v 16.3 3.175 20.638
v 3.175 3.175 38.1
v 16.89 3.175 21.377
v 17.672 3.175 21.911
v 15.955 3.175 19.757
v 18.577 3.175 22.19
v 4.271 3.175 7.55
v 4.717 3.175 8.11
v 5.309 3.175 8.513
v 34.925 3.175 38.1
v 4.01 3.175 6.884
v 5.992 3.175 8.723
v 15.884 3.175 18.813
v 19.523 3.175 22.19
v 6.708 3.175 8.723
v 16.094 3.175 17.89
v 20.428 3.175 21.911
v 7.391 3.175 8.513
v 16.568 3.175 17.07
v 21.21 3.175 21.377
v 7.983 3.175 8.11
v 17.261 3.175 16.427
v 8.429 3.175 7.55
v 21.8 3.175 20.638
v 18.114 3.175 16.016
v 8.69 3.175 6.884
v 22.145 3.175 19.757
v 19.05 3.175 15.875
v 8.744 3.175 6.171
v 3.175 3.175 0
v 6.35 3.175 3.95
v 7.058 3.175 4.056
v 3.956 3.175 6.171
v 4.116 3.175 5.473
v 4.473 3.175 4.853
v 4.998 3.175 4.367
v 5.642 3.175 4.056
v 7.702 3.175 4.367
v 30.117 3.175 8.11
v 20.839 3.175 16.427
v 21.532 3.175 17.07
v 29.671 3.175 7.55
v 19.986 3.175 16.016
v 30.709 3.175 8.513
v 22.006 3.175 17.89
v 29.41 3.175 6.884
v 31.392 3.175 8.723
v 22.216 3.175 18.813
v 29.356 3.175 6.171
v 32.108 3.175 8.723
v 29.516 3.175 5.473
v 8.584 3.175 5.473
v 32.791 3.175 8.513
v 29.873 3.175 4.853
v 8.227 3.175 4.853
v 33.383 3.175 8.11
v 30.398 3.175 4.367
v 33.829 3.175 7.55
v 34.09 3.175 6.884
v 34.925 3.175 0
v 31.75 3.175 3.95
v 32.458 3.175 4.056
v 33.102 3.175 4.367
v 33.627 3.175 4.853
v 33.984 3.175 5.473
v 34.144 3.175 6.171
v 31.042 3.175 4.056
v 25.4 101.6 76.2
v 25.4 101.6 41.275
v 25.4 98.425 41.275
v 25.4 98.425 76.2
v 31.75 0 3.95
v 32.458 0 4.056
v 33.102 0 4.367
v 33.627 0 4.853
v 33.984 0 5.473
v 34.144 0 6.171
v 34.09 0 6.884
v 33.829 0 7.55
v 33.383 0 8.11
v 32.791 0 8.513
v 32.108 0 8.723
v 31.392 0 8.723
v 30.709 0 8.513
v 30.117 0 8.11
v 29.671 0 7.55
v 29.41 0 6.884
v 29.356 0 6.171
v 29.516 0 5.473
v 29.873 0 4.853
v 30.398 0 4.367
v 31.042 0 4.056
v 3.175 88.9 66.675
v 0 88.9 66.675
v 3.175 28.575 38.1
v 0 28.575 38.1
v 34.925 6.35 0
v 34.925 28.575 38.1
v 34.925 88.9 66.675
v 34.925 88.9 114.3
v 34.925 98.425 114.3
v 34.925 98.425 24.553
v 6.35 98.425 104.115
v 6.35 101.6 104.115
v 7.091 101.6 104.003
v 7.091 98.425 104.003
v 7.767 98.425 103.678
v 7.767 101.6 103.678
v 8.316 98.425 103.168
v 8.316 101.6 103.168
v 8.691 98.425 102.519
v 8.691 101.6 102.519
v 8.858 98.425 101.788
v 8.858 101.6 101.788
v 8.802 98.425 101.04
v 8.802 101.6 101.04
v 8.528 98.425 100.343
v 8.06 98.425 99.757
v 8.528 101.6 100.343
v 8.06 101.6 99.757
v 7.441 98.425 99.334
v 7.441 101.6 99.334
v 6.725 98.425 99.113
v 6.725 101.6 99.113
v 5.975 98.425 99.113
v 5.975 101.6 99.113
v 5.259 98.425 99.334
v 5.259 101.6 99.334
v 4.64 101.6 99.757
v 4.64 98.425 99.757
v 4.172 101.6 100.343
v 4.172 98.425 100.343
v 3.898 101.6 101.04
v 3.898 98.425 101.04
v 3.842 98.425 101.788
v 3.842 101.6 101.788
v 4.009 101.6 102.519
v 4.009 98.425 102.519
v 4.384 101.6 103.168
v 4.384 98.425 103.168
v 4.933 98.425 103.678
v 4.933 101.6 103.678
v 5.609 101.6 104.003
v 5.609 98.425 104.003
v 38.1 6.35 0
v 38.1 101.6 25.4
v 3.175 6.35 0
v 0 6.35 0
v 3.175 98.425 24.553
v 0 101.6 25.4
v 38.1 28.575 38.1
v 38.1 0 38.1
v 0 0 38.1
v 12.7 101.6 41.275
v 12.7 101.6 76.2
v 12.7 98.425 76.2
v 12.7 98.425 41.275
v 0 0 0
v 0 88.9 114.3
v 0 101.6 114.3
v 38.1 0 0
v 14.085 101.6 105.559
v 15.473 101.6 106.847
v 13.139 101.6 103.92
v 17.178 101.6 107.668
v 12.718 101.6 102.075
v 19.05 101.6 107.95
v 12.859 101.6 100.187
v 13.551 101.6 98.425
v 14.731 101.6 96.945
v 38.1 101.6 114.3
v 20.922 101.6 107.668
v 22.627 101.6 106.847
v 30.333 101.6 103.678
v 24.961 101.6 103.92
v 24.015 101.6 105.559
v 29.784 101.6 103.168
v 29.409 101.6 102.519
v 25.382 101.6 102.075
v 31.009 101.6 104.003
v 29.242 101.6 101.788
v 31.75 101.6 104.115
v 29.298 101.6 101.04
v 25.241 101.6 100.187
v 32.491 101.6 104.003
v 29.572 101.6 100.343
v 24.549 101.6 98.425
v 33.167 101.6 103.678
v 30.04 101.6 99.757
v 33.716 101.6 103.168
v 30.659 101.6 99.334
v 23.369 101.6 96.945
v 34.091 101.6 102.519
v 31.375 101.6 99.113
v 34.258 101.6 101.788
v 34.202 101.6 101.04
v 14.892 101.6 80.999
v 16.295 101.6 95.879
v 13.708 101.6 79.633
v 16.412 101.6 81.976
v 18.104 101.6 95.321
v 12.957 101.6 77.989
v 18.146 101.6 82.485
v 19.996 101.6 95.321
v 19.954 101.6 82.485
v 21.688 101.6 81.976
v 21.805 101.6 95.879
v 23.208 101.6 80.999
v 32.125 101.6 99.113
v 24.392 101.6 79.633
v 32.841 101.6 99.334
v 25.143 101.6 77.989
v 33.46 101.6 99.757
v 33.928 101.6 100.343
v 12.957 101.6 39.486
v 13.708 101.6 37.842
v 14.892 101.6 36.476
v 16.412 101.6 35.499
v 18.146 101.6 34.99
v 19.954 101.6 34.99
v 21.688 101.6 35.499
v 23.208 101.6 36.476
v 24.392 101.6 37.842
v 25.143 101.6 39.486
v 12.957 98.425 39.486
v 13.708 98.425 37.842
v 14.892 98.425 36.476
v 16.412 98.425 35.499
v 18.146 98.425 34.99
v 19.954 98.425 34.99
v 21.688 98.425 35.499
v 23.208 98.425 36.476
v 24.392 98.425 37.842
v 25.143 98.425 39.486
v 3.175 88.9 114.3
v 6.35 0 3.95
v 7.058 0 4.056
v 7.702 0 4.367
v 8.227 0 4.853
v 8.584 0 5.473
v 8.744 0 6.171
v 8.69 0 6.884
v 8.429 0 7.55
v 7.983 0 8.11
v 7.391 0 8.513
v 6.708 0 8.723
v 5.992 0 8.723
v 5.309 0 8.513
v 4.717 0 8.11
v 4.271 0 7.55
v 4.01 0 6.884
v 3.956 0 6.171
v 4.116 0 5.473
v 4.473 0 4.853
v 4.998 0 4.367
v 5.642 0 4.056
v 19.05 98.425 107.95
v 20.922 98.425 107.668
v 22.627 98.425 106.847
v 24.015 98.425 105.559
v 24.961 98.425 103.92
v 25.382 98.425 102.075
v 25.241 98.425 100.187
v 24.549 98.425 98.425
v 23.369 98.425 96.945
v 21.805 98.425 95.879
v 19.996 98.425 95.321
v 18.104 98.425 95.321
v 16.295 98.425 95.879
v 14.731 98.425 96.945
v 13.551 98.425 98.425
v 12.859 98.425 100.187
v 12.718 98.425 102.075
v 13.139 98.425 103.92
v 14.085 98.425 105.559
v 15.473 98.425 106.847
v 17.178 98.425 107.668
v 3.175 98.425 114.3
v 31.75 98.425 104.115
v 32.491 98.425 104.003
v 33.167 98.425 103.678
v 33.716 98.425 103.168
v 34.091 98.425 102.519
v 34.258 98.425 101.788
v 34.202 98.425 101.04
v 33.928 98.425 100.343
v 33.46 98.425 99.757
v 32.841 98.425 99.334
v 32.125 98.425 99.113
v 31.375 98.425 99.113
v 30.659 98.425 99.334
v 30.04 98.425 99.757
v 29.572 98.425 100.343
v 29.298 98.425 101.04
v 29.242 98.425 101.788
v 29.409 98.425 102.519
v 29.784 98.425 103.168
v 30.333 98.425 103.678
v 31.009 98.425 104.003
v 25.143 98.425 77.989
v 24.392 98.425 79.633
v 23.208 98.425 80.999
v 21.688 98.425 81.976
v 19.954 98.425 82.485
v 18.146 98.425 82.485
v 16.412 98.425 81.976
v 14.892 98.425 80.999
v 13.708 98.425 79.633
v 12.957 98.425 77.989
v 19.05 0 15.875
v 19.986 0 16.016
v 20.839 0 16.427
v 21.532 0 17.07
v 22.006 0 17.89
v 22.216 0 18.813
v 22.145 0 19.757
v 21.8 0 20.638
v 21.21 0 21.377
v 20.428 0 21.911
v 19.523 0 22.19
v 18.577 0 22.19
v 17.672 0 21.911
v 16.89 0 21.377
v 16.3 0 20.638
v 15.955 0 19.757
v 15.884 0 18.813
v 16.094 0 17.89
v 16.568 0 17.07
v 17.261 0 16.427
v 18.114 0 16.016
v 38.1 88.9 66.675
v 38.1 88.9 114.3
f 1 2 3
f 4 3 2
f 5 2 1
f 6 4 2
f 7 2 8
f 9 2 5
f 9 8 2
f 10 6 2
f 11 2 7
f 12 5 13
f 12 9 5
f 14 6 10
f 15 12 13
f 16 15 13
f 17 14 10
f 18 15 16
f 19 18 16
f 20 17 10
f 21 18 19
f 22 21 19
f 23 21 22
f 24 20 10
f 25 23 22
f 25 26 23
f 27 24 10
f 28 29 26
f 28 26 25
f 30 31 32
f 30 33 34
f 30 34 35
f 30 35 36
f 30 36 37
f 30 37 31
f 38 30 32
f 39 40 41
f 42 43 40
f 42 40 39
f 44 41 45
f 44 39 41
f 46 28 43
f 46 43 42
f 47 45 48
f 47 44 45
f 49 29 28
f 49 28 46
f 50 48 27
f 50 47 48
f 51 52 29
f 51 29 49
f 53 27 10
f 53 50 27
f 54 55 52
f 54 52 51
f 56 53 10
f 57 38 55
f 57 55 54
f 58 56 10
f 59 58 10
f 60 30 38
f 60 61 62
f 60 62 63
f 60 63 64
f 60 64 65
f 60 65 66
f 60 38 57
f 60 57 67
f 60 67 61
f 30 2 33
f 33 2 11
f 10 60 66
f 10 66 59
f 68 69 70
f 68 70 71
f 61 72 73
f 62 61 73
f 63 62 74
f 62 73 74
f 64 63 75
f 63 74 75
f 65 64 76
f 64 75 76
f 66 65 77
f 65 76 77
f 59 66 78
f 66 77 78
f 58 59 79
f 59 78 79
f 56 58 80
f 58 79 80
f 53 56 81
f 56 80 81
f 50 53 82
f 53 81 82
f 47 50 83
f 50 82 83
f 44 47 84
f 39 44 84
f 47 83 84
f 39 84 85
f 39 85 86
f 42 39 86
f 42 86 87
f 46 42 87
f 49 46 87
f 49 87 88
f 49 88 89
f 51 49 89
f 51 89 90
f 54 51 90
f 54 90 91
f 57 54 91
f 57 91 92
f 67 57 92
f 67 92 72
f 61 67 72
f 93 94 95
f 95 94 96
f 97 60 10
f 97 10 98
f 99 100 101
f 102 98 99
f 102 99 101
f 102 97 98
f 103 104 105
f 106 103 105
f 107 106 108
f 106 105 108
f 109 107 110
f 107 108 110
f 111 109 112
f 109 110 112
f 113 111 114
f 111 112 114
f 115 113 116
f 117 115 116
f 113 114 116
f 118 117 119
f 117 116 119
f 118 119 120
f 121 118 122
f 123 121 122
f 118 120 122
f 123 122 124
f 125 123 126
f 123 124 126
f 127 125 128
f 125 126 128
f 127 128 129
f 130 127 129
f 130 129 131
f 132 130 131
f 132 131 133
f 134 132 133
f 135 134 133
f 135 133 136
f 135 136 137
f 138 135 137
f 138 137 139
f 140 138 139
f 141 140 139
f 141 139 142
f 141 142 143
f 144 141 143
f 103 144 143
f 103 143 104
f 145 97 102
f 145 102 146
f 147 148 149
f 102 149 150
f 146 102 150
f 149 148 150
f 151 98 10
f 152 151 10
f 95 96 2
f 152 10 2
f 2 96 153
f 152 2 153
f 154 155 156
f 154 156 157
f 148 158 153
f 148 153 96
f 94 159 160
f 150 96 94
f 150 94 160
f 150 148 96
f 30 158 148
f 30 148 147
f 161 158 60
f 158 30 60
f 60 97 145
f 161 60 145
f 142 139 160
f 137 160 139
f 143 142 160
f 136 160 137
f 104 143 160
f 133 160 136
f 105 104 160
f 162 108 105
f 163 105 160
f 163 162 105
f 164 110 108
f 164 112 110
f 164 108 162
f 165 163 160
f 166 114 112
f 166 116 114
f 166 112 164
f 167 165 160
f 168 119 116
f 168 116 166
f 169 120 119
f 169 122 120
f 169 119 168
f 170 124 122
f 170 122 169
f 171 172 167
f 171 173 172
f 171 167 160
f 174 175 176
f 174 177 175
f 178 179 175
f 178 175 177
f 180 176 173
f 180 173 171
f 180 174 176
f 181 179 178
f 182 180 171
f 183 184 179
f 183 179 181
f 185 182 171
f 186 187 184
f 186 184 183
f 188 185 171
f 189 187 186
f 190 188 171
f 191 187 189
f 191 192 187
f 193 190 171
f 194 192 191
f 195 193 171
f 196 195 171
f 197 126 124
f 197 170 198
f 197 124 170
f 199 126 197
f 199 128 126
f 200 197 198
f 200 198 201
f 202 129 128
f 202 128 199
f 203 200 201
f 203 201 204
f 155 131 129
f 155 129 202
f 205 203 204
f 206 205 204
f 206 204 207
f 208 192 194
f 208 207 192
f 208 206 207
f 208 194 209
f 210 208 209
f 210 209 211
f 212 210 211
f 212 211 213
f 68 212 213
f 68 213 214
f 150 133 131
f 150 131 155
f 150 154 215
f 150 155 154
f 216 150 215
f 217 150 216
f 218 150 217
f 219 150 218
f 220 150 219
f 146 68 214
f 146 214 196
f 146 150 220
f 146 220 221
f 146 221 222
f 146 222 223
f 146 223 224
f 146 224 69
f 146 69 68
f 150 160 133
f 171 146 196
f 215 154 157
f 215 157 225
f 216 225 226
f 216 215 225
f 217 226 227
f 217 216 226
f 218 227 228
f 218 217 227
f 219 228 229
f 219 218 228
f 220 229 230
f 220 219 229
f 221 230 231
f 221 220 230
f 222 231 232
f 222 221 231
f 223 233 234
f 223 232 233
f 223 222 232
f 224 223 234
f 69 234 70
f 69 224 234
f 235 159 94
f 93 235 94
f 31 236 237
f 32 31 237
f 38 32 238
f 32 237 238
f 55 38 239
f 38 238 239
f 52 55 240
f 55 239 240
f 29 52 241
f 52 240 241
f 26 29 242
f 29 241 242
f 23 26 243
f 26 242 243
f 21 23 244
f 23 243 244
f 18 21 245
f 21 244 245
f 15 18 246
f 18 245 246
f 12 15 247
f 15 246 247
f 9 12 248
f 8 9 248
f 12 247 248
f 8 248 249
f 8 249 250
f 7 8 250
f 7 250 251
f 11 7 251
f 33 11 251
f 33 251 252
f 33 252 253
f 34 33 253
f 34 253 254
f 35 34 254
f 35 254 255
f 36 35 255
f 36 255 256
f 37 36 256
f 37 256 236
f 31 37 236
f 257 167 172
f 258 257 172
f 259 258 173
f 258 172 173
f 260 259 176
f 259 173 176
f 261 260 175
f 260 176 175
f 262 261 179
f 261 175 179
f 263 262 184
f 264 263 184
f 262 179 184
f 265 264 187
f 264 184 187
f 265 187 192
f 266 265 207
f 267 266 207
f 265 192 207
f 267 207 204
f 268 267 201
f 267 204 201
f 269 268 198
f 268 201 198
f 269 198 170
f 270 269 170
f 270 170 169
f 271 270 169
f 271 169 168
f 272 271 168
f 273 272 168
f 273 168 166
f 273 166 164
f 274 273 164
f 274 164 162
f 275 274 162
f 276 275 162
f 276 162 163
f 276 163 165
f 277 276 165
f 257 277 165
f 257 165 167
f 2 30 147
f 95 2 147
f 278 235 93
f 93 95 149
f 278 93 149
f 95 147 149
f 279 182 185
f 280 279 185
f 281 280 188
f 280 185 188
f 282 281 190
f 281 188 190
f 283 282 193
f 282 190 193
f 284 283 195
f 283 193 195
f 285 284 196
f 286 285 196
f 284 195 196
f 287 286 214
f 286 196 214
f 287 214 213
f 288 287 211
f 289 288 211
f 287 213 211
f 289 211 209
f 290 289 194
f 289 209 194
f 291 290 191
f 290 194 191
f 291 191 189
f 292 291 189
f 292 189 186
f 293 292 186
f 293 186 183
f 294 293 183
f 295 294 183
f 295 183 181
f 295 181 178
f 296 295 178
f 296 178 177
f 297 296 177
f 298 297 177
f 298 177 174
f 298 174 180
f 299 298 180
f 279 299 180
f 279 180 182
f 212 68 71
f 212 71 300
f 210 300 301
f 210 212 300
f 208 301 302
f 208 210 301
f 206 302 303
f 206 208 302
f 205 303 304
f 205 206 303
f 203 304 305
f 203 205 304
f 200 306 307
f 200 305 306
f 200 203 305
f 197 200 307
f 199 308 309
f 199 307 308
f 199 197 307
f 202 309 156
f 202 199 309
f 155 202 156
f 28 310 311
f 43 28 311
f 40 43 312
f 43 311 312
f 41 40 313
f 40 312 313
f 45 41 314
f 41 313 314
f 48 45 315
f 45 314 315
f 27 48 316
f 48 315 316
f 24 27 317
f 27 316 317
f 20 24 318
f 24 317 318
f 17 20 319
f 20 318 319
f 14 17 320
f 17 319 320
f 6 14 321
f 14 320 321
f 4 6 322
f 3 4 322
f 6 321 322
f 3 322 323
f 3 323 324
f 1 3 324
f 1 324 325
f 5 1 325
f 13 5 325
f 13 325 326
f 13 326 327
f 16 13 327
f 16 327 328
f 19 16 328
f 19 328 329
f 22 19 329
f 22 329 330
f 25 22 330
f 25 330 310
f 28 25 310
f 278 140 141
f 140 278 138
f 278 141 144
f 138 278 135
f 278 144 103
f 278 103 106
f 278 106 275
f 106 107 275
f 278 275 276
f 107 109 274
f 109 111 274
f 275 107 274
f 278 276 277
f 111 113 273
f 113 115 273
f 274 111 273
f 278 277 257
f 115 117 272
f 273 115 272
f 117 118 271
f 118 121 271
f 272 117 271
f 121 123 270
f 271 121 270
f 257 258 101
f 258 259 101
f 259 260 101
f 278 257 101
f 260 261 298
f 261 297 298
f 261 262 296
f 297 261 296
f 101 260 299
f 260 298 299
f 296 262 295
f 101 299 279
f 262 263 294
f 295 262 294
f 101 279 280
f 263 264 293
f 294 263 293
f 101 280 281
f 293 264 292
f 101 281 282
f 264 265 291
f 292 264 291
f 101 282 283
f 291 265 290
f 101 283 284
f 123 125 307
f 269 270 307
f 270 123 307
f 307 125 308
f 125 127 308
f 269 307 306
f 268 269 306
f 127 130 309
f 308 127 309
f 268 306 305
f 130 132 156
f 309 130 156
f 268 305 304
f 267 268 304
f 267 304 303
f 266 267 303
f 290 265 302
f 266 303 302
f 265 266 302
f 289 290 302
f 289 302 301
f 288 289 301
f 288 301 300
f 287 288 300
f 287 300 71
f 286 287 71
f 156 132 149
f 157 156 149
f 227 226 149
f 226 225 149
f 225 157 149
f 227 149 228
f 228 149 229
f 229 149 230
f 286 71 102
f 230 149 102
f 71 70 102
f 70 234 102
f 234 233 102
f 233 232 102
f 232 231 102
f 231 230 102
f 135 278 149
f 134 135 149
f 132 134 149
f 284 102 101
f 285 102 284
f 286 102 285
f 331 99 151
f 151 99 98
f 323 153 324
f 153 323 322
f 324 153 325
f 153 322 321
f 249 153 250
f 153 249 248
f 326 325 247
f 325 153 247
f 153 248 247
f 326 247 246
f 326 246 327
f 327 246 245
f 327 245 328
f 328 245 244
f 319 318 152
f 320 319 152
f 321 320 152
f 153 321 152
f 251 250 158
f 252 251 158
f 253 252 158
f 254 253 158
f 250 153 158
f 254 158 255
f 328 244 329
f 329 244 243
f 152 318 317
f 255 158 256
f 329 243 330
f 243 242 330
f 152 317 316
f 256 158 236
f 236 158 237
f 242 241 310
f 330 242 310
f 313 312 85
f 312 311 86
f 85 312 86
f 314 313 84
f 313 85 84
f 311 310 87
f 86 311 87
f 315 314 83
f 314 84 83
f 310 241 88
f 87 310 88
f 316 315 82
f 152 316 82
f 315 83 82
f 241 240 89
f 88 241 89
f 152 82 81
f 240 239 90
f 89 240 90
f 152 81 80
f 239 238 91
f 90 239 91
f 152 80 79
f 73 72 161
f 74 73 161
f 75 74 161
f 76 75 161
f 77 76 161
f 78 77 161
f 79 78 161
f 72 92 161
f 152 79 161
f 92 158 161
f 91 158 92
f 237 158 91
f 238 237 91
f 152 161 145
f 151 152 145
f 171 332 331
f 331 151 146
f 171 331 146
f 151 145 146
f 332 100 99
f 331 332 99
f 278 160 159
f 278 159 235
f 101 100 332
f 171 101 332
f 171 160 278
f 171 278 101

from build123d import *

# Parameters (mm, degrees)
SKETCH3_W           = 38.1
SKETCH3_H           = 101.6
SKETCH3_W_2         = 31.75
SKETCH3_H_2         = 95.25
BOSS_EXTRUDE1_DEPTH = 114.3
CUT_EXTRUDE1_DEPTH  = 158.602855304
CUT_EXTRUDE2_REACH  = 159.603
SKETCH6_R           = 2.4003
SKETCH6_R_2         = 3.175
CUT_EXTRUDE3_REACH  = 159.603
SKETCH7_R           = 2.5146
SKETCH7_R_2         = 6.35


with BuildPart() as part:
    # Sketch3 → Boss-Extrude1 (new body)
    with BuildSketch(Plane.XY):
        with Locations((19.05, 50.8)):
            Rectangle(SKETCH3_W, SKETCH3_H)
        with Locations((19.05, 50.8)):
            Rectangle(SKETCH3_W_2, SKETCH3_H_2, mode=Mode.SUBTRACT)
    extrude(amount=BOSS_EXTRUDE1_DEPTH)

    # Sketch5 → Cut-Extrude1 (cut, through all)
    with BuildSketch(Plane.ZY):
        Polygon((0, 101.6), (0, 6.35), (25.4, 101.6), align=None)
        Polygon((66.675, 88.9), (38.1, 28.575), (38.1, 0), (114.3, 0), (114.3, 88.9), align=None)
    extrude(amount=-CUT_EXTRUDE1_DEPTH, mode=Mode.SUBTRACT)

    # Sketch6 → Cut-Extrude2 (cut, up to next)
    with BuildSketch(Plane.XZ, mode=Mode.PRIVATE) as cut_extrude2_sk1:
        with Locations(Location((31.75, 6.35, 0), (0, 0, 270))):
            Circle(SKETCH6_R)
    cut_extrude2_tool1 = extrude(cut_extrude2_sk1.sketch, amount=-CUT_EXTRUDE2_REACH, mode=Mode.PRIVATE) & part.part
    # Sketch6 → Cut-Extrude2 (cut, up to next)
    with BuildSketch(Plane.XZ, mode=Mode.PRIVATE) as cut_extrude2_sk2:
        with Locations(Location((6.35, 6.35, 0), (0, 0, 270))):
            Circle(SKETCH6_R)
    cut_extrude2_tool2 = extrude(cut_extrude2_sk2.sketch, amount=-CUT_EXTRUDE2_REACH, mode=Mode.PRIVATE) & part.part
    # Sketch6 → Cut-Extrude2 (cut, up to next)
    with BuildSketch(Plane.XZ, mode=Mode.PRIVATE) as cut_extrude2_sk3:
        with Locations(Location((19.05, 19.05, 0), (0, 0, 270))):
            Circle(SKETCH6_R_2)
    cut_extrude2_tool3 = extrude(cut_extrude2_sk3.sketch, amount=-CUT_EXTRUDE2_REACH, mode=Mode.PRIVATE) & part.part
    add(cut_extrude2_tool1.solids().sort_by_distance((31.75, 0, 6.35))[0], mode=Mode.SUBTRACT)
    add(cut_extrude2_tool2.solids().sort_by_distance((6.35, 0, 6.35))[0], mode=Mode.SUBTRACT)
    add(cut_extrude2_tool3.solids().sort_by_distance((19.05, 0, 19.05))[0], mode=Mode.SUBTRACT)

    # Sketch7 → Cut-Extrude3 (cut, up to next)
    with BuildSketch(Plane(origin=(0, 101.6, 0), x_dir=(1, 0, 0), z_dir=(0, 1, 0)), mode=Mode.PRIVATE) as cut_extrude3_sk1:
        with Locations(Location((6.35, -101.6, 0), (0, 0, 270))):
            Circle(SKETCH7_R)
    cut_extrude3_tool1 = extrude(cut_extrude3_sk1.sketch, amount=-CUT_EXTRUDE3_REACH, mode=Mode.PRIVATE) & part.part
    # Sketch7 → Cut-Extrude3 (cut, up to next)
    with BuildSketch(Plane(origin=(0, 101.6, 0), x_dir=(1, 0, 0), z_dir=(0, 1, 0)), mode=Mode.PRIVATE) as cut_extrude3_sk2:
        with Locations(Location((31.75, -101.6, 0), (0, 0, 270))):
            Circle(SKETCH7_R)
    cut_extrude3_tool2 = extrude(cut_extrude3_sk2.sketch, amount=-CUT_EXTRUDE3_REACH, mode=Mode.PRIVATE) & part.part
    # Sketch7 → Cut-Extrude3 (cut, up to next)
    with BuildSketch(Plane(origin=(0, 101.6, 0), x_dir=(1, 0, 0), z_dir=(0, 1, 0)), mode=Mode.PRIVATE) as cut_extrude3_sk3:
        with Locations(Location((19.05, -101.6, 0), (0, 0, 270))):
            Circle(SKETCH7_R_2)
    cut_extrude3_tool3 = extrude(cut_extrude3_sk3.sketch, amount=-CUT_EXTRUDE3_REACH, mode=Mode.PRIVATE) & part.part
    # Sketch7 → Cut-Extrude3 (cut, up to next)
    with BuildSketch(Plane(origin=(0, 101.6, 0), x_dir=(1, 0, 0), z_dir=(0, 1, 0)), mode=Mode.PRIVATE) as cut_extrude3_sk4:
        with BuildLine():
            Line((25.4, -41.275), (25.4, -76.2))
            ThreePointArc((25.4, -76.2), (19.05, -82.55), (12.7, -76.2))
            Line((12.7, -76.2), (12.7, -41.275))
            ThreePointArc((12.7, -41.275), (19.05, -34.925), (25.4, -41.275))
        make_face()
    cut_extrude3_tool4 = extrude(cut_extrude3_sk4.sketch, amount=-CUT_EXTRUDE3_REACH, mode=Mode.PRIVATE) & part.part
    add(cut_extrude3_tool1.solids().sort_by_distance((6.35, 101.6, 101.6))[0], mode=Mode.SUBTRACT)
    add(cut_extrude3_tool2.solids().sort_by_distance((31.75, 101.6, 101.6))[0], mode=Mode.SUBTRACT)
    add(cut_extrude3_tool3.solids().sort_by_distance((19.05, 101.6, 101.6))[0], mode=Mode.SUBTRACT)
    add(cut_extrude3_tool4.solids().sort_by_distance((19.05, 101.6, 58.7375))[0], mode=Mode.SUBTRACT)


solid = part.part
